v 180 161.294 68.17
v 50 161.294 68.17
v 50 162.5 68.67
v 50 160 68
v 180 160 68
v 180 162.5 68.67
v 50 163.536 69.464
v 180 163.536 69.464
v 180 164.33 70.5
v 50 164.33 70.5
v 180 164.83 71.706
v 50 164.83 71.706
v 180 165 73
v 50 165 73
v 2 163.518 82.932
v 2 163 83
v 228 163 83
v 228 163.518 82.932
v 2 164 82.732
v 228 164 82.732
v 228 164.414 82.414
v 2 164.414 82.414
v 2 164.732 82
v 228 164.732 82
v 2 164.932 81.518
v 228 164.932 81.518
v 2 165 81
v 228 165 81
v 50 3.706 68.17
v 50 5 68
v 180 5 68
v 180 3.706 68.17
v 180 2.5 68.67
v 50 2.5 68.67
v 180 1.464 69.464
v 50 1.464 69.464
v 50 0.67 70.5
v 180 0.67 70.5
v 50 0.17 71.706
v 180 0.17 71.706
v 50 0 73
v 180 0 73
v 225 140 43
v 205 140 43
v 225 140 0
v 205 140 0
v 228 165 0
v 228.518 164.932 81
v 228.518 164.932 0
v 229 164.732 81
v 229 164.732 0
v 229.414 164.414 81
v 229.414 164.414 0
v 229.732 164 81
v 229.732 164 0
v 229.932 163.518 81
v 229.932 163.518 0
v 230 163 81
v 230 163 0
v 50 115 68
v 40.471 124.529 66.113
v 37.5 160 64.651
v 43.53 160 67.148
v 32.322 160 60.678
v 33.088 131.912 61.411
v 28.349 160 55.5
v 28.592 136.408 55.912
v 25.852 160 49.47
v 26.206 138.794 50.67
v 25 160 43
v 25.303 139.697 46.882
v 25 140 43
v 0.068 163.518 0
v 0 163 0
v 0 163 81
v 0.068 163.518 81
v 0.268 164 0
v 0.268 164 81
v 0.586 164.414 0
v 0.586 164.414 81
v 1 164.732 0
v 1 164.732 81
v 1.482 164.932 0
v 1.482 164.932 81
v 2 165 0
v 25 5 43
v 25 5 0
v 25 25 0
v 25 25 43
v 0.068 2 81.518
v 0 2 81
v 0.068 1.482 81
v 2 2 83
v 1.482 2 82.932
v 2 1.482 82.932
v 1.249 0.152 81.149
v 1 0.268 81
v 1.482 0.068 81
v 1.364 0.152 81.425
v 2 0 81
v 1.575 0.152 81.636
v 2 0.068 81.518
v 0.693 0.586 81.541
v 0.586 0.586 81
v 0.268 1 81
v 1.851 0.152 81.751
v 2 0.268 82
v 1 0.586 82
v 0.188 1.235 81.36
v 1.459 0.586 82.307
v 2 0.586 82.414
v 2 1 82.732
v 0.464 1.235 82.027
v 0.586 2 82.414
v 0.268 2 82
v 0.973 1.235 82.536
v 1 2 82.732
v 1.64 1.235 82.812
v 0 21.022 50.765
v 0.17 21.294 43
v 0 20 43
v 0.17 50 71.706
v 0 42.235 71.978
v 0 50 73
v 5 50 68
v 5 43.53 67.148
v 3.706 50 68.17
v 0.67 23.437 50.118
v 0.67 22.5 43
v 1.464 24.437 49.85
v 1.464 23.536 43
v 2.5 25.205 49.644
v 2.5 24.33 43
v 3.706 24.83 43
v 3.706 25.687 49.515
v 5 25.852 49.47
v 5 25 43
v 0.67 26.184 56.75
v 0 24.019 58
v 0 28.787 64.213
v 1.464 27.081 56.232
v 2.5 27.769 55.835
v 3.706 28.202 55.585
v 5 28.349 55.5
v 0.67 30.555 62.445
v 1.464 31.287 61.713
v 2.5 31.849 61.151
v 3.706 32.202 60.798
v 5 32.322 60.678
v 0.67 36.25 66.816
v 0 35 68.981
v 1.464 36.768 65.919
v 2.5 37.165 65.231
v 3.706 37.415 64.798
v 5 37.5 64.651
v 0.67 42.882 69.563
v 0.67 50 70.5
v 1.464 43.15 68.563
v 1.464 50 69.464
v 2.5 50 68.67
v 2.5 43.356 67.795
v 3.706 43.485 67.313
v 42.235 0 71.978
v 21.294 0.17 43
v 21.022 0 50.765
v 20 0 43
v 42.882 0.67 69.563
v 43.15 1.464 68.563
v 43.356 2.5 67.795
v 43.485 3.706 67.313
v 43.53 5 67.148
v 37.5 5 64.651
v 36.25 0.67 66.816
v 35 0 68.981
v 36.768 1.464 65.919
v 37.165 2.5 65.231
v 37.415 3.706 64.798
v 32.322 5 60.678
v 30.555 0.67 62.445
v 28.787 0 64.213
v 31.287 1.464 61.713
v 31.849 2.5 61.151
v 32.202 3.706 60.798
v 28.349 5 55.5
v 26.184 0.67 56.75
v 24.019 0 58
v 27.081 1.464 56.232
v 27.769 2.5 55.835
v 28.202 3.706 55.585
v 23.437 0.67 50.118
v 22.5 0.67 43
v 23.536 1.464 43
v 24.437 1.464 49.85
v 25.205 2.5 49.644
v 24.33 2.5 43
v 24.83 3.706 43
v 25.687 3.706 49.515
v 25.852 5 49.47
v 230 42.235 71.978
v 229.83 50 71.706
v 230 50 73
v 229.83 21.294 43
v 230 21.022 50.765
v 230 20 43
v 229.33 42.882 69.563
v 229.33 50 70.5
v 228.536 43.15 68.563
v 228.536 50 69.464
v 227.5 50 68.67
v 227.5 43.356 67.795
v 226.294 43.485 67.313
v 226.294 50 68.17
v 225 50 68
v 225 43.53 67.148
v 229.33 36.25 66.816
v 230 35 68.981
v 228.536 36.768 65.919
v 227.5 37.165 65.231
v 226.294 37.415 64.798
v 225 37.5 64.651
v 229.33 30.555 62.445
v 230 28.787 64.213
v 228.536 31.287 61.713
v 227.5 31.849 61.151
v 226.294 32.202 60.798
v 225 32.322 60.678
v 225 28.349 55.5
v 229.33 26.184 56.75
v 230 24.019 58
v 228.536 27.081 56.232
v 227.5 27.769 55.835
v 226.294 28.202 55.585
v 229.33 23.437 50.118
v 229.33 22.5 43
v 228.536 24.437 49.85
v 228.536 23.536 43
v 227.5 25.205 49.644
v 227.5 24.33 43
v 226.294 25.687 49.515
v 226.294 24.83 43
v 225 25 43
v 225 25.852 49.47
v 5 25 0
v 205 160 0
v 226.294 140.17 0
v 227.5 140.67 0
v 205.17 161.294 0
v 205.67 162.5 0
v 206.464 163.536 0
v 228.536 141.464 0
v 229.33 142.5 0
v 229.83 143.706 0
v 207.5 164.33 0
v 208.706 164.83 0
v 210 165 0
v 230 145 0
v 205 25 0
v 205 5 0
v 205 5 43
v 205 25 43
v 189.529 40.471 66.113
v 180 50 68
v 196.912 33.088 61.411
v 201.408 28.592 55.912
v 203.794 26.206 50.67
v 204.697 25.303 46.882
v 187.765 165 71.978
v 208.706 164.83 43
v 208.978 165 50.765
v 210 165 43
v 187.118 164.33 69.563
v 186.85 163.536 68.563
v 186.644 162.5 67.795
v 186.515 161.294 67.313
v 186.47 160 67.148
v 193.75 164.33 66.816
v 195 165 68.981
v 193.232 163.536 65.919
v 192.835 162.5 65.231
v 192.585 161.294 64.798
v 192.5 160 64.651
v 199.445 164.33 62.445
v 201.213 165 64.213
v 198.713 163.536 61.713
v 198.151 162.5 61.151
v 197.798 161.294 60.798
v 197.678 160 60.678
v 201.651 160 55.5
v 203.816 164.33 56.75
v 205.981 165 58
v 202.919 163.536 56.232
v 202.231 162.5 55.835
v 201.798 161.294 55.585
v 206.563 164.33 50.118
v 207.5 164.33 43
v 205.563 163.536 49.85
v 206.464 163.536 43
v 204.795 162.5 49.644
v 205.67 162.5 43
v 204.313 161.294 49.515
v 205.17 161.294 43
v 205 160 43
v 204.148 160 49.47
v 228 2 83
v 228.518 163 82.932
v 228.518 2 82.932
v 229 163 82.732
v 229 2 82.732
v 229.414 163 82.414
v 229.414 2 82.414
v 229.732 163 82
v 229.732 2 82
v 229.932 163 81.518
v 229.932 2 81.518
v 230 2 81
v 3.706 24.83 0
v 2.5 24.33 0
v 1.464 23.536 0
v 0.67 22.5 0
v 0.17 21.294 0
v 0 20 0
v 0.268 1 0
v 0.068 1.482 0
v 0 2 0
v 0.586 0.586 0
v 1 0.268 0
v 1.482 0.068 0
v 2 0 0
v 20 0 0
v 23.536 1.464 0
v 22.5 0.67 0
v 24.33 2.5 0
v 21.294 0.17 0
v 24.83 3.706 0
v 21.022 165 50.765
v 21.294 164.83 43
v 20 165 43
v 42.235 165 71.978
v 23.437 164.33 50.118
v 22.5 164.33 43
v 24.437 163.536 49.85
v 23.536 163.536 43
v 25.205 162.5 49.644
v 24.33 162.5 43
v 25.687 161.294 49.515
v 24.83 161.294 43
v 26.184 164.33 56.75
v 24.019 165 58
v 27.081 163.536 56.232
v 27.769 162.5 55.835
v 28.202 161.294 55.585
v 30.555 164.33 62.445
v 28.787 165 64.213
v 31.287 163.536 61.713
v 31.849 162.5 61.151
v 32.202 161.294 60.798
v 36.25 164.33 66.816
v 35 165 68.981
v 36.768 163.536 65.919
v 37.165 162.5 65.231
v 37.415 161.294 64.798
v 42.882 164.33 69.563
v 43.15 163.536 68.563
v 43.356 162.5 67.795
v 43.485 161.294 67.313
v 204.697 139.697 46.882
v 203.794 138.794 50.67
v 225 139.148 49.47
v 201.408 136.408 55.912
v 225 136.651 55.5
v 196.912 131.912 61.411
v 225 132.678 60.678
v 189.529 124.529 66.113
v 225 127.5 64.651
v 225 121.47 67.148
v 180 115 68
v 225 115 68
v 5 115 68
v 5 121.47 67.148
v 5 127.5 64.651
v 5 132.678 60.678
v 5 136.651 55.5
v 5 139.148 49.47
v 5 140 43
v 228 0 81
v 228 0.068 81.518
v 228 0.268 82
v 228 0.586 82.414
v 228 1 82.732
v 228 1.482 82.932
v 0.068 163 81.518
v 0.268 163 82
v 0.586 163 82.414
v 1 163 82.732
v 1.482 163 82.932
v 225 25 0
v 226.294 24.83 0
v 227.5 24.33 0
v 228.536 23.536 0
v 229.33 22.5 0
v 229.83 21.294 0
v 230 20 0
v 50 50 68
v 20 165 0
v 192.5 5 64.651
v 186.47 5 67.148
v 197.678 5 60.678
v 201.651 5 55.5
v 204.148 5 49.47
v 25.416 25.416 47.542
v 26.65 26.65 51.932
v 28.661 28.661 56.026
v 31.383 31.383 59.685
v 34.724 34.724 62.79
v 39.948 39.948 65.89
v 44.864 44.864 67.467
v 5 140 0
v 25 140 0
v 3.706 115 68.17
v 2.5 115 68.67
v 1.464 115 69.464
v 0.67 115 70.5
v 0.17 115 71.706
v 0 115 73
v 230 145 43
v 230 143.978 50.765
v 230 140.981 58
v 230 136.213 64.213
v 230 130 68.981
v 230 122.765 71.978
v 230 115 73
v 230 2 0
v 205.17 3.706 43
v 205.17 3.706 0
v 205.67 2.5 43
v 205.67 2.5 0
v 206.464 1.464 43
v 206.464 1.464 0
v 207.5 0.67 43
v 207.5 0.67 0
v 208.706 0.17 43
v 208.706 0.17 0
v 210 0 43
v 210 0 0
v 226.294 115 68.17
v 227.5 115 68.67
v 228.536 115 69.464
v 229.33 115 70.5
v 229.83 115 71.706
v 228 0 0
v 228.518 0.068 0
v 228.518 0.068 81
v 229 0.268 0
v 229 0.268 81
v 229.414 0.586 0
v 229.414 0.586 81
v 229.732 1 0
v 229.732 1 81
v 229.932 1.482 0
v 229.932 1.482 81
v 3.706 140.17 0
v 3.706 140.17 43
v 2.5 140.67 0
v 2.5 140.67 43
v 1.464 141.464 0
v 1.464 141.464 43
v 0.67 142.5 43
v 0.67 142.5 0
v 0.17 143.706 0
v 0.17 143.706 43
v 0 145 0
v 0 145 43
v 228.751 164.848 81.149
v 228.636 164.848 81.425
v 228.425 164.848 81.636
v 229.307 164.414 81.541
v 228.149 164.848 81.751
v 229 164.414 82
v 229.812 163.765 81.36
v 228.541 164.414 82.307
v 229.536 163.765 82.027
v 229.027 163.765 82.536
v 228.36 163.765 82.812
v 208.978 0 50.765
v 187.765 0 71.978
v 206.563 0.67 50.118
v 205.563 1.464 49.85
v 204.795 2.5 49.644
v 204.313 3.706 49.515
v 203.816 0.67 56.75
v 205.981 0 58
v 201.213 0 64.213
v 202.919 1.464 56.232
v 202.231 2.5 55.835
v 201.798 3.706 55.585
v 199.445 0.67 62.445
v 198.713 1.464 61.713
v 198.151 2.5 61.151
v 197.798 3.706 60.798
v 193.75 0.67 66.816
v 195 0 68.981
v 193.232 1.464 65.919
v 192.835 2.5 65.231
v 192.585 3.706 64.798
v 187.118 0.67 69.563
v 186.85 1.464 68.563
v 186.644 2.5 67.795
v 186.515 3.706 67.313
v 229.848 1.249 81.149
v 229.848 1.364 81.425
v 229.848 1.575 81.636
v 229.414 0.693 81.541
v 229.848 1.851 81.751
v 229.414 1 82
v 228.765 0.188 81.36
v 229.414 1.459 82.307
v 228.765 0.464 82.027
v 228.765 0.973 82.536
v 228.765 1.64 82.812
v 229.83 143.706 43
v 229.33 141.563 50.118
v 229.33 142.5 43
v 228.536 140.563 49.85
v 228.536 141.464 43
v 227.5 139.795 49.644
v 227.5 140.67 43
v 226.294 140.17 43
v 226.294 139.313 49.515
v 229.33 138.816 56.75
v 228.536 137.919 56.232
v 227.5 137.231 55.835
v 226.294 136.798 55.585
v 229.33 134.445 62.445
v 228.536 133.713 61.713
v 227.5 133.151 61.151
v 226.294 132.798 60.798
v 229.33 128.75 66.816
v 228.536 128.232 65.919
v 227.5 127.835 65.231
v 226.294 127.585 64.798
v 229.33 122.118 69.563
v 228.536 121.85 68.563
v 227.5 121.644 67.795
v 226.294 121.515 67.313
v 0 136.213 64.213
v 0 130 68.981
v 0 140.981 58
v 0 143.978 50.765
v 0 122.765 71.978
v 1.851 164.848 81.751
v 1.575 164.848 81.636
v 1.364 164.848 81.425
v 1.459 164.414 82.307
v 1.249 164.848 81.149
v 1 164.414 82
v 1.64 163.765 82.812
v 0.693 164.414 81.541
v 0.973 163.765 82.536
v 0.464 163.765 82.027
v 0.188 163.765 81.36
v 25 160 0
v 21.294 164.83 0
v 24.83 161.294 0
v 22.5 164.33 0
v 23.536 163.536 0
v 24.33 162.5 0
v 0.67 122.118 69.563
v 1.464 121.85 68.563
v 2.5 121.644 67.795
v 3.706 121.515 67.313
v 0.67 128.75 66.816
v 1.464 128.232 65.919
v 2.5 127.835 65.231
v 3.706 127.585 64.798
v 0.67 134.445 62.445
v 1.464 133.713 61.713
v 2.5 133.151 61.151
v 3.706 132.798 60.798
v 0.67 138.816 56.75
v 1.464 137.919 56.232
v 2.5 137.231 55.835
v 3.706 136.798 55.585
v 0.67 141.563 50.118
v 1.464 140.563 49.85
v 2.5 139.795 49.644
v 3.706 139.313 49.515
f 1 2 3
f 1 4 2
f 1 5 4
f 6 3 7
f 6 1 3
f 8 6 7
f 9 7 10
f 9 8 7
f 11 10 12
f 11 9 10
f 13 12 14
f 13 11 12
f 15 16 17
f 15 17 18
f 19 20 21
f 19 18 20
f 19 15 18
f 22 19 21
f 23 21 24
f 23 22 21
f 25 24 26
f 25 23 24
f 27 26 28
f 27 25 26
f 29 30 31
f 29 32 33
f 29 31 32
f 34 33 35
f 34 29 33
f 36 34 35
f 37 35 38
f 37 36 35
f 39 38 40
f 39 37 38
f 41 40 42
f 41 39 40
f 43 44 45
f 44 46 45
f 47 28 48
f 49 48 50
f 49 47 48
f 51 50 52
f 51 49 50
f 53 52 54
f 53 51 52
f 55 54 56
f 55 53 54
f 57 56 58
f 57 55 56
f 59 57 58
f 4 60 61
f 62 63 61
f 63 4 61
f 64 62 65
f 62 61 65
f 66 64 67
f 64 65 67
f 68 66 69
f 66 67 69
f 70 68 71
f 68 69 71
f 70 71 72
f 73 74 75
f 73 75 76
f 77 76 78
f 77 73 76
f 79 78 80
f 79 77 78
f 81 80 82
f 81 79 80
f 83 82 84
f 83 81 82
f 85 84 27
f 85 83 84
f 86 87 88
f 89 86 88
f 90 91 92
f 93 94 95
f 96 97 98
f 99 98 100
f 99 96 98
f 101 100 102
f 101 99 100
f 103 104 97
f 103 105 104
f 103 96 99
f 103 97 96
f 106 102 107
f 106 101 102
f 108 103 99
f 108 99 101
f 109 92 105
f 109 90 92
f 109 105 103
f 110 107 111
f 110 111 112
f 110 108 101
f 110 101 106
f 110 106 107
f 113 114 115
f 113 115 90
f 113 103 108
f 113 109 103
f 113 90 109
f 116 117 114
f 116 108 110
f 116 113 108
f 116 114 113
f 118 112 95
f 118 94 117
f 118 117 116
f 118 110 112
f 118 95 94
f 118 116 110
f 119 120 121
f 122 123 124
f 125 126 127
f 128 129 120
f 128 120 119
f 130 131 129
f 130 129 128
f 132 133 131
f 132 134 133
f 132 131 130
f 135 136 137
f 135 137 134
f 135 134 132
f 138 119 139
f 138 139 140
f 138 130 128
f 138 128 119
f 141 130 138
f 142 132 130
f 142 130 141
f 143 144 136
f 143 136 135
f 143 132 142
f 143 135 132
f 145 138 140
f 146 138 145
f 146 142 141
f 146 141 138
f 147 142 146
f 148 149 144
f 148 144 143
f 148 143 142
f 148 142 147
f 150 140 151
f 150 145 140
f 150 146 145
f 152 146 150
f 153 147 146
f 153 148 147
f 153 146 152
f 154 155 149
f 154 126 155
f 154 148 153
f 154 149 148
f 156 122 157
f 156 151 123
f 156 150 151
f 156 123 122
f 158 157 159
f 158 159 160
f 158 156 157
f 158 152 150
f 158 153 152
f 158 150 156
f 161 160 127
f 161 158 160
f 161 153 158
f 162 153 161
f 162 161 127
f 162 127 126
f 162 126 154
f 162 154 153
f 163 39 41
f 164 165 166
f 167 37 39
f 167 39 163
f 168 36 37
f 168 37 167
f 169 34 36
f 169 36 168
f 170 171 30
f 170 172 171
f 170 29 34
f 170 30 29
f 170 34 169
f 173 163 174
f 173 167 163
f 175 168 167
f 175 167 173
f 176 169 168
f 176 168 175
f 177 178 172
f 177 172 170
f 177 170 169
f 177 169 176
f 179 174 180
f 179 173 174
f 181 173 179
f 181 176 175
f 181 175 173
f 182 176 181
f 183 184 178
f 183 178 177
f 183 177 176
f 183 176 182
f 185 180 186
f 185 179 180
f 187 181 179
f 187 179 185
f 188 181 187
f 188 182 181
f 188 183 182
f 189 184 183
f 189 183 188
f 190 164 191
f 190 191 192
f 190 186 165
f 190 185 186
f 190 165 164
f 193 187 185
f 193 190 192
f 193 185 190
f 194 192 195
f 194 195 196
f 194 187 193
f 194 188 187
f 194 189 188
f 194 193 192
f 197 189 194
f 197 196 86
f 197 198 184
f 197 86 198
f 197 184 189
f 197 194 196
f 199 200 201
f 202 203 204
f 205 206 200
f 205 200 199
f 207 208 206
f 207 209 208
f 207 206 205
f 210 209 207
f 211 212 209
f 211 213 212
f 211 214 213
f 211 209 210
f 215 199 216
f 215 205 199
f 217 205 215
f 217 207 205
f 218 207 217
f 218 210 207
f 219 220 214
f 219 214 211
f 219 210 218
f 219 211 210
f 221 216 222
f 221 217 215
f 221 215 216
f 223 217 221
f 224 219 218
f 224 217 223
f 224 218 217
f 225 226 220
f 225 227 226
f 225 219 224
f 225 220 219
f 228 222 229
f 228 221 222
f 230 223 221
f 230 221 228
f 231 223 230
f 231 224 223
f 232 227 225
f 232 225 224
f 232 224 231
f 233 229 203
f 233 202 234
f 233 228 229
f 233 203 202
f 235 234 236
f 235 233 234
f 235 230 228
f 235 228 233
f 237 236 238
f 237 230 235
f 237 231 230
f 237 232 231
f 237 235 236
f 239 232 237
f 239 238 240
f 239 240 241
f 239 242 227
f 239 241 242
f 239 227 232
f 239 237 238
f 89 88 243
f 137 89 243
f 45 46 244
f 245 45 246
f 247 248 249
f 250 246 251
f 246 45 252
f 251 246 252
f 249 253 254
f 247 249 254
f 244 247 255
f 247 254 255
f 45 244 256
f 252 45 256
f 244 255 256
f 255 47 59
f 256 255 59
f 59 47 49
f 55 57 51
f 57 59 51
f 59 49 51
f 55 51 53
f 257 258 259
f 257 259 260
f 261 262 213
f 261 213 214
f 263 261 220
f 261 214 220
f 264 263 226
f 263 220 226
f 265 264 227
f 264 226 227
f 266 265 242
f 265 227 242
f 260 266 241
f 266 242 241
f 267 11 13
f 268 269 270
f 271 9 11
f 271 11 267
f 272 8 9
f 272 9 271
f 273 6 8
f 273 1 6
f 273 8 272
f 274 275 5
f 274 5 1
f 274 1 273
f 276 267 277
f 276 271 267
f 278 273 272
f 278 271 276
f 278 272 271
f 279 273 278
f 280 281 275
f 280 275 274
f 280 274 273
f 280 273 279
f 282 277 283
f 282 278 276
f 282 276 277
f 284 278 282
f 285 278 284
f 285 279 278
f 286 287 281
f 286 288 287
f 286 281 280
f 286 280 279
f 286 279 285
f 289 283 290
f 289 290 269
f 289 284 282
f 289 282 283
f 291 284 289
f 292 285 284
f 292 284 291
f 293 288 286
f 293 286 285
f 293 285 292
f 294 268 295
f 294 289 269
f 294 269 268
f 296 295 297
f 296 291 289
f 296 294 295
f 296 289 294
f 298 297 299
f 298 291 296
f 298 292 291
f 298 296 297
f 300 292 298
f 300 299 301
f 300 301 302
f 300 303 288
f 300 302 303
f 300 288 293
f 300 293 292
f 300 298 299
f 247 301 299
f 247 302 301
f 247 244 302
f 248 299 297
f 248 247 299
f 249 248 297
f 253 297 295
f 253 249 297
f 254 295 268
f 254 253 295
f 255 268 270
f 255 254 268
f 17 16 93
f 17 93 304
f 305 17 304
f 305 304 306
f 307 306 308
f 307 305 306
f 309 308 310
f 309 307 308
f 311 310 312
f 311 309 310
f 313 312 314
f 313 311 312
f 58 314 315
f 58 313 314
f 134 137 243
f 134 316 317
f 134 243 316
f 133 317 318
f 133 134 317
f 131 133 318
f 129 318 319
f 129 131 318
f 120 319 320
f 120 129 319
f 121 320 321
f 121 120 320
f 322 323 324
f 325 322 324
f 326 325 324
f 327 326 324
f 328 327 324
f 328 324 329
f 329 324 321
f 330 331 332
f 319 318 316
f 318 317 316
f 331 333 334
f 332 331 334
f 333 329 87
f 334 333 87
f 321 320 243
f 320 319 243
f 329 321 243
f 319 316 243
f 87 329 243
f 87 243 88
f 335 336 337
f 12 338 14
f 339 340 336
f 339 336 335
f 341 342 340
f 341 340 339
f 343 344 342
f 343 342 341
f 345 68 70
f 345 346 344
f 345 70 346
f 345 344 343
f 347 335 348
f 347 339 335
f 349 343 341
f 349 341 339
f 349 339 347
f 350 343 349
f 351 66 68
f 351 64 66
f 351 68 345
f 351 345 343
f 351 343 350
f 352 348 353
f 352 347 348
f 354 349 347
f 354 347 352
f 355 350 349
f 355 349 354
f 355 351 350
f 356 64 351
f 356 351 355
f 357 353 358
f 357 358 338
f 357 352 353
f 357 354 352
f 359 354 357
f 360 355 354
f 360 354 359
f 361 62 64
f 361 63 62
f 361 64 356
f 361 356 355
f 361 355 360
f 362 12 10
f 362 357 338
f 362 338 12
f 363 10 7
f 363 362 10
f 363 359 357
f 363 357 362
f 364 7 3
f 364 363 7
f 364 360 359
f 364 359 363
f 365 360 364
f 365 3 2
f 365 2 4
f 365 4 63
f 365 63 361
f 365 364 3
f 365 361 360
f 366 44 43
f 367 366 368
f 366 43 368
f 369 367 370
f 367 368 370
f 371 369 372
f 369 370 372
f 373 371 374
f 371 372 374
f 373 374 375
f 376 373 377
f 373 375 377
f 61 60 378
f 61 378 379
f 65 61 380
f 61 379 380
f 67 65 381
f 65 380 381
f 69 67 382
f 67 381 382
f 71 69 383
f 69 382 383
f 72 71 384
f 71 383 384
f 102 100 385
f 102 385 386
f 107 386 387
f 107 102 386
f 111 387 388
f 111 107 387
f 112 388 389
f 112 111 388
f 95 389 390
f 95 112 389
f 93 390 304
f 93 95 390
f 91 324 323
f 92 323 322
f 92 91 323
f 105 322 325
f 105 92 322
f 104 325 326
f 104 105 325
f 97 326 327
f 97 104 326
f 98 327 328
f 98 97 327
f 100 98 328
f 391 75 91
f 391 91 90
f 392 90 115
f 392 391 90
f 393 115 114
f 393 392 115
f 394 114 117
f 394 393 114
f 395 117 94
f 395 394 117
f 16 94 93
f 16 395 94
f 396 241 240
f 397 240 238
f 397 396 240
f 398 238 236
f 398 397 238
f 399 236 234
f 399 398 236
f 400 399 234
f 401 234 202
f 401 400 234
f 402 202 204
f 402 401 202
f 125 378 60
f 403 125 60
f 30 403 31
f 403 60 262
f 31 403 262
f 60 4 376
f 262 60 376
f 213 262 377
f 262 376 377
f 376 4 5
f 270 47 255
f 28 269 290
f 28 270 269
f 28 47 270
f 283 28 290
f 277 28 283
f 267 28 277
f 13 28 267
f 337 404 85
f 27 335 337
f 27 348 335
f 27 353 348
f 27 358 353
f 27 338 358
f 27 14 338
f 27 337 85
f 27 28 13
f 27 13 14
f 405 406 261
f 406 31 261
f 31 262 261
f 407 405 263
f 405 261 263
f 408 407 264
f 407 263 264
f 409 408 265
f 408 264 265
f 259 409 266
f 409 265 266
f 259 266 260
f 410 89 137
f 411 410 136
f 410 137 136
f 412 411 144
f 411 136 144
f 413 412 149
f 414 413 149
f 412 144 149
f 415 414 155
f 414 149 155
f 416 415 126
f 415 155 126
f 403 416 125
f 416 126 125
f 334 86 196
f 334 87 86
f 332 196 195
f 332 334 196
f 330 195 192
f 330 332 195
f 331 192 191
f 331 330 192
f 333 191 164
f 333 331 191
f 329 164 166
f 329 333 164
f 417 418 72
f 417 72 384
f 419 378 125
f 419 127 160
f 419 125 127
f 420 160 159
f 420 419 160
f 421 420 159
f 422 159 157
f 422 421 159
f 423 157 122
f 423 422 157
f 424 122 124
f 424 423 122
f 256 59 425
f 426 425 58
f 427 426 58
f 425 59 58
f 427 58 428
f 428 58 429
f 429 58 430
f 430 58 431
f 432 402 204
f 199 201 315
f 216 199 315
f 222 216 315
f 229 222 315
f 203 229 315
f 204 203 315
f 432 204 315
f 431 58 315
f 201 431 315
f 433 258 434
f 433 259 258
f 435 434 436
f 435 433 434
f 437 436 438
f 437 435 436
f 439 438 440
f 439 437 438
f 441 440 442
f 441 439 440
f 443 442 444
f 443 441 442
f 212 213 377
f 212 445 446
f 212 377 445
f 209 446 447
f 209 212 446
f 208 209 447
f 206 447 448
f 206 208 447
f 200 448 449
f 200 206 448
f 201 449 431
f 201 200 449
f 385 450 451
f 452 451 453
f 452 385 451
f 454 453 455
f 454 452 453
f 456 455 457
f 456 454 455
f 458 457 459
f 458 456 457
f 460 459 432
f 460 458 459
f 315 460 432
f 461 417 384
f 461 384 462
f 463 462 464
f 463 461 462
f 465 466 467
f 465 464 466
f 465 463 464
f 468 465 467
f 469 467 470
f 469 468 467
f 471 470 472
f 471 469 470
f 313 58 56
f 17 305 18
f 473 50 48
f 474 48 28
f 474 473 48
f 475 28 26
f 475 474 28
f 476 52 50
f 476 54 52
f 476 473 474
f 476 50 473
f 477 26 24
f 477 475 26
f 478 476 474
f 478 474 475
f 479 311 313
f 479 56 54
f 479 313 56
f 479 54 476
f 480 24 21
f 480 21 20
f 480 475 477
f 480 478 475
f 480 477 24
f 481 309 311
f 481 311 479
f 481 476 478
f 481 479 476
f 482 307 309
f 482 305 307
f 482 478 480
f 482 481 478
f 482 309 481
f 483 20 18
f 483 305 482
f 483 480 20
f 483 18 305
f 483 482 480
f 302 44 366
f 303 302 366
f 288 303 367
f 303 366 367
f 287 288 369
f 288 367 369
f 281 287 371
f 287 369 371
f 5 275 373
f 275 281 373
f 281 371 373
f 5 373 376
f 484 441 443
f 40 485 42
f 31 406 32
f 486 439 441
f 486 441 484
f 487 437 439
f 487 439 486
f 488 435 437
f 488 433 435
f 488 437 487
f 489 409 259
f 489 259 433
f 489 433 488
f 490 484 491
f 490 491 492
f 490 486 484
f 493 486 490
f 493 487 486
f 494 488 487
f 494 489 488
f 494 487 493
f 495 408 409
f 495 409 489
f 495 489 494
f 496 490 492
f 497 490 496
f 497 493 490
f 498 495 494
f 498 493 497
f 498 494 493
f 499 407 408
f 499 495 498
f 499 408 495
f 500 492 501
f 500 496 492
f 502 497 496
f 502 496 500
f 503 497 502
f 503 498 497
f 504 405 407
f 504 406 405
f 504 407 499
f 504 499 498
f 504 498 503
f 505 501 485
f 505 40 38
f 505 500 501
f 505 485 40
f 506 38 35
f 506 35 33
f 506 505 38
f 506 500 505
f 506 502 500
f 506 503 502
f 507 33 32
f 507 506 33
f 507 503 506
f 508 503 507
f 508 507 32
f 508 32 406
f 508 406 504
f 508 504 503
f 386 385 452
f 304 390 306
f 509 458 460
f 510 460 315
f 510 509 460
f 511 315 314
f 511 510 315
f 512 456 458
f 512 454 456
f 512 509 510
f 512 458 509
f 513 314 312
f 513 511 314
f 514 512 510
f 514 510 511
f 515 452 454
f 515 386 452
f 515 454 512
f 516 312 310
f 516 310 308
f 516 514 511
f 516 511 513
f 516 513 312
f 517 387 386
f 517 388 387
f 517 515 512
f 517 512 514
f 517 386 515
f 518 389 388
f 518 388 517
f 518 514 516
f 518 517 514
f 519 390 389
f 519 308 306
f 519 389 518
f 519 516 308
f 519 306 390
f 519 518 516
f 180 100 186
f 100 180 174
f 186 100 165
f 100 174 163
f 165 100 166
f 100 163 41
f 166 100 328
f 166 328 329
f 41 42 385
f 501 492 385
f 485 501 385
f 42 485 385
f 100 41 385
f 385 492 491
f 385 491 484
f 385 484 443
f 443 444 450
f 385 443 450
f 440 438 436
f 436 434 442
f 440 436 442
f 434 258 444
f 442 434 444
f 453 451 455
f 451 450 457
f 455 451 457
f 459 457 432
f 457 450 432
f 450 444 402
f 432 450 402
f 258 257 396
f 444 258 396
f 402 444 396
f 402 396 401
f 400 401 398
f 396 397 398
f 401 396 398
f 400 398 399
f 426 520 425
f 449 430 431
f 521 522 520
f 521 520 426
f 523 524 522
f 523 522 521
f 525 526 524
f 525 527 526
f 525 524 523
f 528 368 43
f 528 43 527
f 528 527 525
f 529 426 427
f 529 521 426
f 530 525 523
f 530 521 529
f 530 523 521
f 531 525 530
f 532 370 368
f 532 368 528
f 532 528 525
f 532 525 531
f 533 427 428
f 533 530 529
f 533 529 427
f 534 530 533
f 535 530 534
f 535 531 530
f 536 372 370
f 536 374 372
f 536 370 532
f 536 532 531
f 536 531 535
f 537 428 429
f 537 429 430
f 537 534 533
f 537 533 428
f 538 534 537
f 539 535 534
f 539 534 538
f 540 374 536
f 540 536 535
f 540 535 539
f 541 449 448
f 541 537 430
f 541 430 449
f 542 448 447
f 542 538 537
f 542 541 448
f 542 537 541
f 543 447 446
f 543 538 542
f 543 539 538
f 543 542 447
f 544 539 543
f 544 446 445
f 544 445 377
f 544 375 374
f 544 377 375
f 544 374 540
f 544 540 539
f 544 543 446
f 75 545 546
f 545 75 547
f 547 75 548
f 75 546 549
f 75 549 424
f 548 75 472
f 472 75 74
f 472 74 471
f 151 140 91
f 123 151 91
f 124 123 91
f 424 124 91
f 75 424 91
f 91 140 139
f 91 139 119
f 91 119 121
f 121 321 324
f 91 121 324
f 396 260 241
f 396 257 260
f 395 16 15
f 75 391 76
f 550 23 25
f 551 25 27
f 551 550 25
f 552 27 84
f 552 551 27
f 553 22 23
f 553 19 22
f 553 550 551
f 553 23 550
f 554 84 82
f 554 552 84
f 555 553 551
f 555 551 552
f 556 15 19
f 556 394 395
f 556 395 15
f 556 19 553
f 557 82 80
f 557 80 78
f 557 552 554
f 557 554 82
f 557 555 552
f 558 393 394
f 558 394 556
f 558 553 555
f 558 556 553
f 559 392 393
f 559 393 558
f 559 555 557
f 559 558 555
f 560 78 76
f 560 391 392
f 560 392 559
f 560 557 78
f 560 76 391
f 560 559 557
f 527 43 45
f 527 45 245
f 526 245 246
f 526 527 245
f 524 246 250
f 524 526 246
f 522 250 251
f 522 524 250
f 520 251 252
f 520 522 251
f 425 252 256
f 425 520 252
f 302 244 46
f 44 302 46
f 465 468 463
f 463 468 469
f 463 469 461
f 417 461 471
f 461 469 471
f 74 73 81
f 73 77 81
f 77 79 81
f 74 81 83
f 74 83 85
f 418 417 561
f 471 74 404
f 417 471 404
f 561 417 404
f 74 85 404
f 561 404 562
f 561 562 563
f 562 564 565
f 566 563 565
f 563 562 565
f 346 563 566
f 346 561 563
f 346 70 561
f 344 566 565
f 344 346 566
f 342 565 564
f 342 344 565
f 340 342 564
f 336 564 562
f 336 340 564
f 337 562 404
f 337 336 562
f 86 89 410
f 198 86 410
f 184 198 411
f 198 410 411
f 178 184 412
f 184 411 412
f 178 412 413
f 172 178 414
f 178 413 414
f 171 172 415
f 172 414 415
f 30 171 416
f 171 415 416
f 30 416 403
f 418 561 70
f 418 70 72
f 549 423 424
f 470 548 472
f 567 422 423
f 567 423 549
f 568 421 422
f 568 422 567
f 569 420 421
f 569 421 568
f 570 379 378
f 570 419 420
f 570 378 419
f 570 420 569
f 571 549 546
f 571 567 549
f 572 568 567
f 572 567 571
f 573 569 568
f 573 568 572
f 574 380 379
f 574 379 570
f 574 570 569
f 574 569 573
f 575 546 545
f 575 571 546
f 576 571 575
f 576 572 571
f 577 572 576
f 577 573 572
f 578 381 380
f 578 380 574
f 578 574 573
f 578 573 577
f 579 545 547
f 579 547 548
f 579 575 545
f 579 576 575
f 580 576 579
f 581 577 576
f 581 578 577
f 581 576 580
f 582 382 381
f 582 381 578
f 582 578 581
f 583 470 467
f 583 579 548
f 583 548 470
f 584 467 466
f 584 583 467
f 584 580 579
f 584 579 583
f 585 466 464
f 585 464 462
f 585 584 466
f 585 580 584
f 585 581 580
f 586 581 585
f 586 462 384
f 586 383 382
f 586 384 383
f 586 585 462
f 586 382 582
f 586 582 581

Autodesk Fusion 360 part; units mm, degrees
sketch "Boceto1" plane through (0, 0, 0) normal (0, 0, 1) x (1, 0, 0)
  line L0 (0, 0) -> (230, 0)
  line L1 (230, 0) -> (230, 165)
  line L2 (230, 165) -> (0, 165)
  line L3 (0, 165) -> (0, 0)
  line L4 (0, 165) -> (25, 165)
  line L5 (25, 165) -> (25, 140)
  line L6 (25, 140) -> (0, 140)
  line L7 (0, 140) -> (0, 165)
  line L8 (230, 165) -> (205, 165)
  line L9 (205, 165) -> (205, 140)
  line L10 (205, 140) -> (230, 140)
  line L11 (230, 140) -> (230, 165)
  line L12 (230, 0) -> (205, 0)
  line L13 (205, 0) -> (205, 25)
  line L14 (205, 25) -> (230, 25)
  line L15 (230, 25) -> (230, 0)
  line L16 (0, 0) -> (25, 0)
  line L17 (25, 0) -> (25, 25)
  line L18 (25, 25) -> (0, 25)
  line L19 (0, 25) -> (0, 0)
  dimension "d1" = 230
  dimension "d2" = 165
  dimension "d12" = 25
ref_plane "WorkPlane1" through (115, 82.5, 83) normal (0, 0, 1) x (1, 0, 0)
extrude "Extrude4" add sketch "Boceto1" along normal blind 83 contours L0 L3 L16 L17 L18 L19 | L0 L1 L12 L13 L14 L15 | L2 L3 L4 L5 L6 L7 | L1 L2 L8 L9 L10 L11 makes body 1 at (0, 16.6667, 27.6667) makes body 2 at (205, 8.3333, 27.6667) makes body 3 at (0, 156.6667, 27.6667) makes body 4 at (213.3333, 140, 27.6667)
sketch "Sketch4" plane through (0, 0, 83) normal (0, 0, 1) x (1, 0, 0)
  line L0 (25, 25) -> (0, 25)
  line L1 (25, 0) -> (25, 25)
  line L2 (0, 0) -> (25, 0)
  line L3 (0, 25) -> (0, 0)
  line L4 (0, 140) -> (0, 165)
  line L5 (0, 165) -> (25, 165)
  line L6 (25, 165) -> (25, 140)
  line L7 (25, 140) -> (0, 140)
  line L8 (205, 140) -> (230, 140)
  line L9 (205, 165) -> (205, 140)
  line L10 (230, 165) -> (205, 165)
  line L11 (230, 140) -> (230, 165)
  line L12 (230, 25) -> (230, 0)
  line L13 (230, 0) -> (205, 0)
  line L14 (205, 0) -> (205, 25)
  line L15 (205, 25) -> (230, 25)
  line L16 (0, 0) -> (230, 0)
  line L17 (230, 0) -> (230, 165)
  line L18 (230, 165) -> (0, 165)
  line L19 (0, 165) -> (0, 0)
extrude "Extrude5" add sketch "Sketch4" against normal blind 15 bodies 1 2 3 4
sketch "Sketch5" plane through (0, 0, 83) normal (0, 0, 1) x (-1, 0, 0)
  line L0 (-230, -165) -> (0, -165)
  line L1 (0, -165) -> (0, 0)
  line L2 (0, 0) -> (-230, 0)
  line L3 (-230, 0) -> (-230, -165)
  line L4 (-5, -5) -> (-225, -5)
  line L5 (-225, -5) -> (-225, -160)
  line L6 (-225, -160) -> (-5, -160)
  line L7 (-5, -160) -> (-5, -5)
  dimension "d17" = -5
fillet "Fillet1" radius 25 8 edges at (12.5, 25, 68) (25, 12.5, 68) (25, 152.5, 68) (12.5, 140, 68) (217.5, 140, 68) (205, 152.5, 68) (205, 12.5, 68) (217.5, 25, 68) on bodies 1
fillet "Fillet2" radius 5 20 edges at (205, 0, 21.5) (197.6777, 0, 60.6777) (115, 0, 68) (32.3223, 0, 60.6777) (25, 0, 21.5) (230, 140, 21.5) (230, 132.6777, 60.6777) (230, 82.5, 68) (230, 32.3223, 60.6777) (230, 25, 21.5) (25, 165, 21.5) (32.3223, 165, 60.6777) (115, 165, 68) (197.6777, 165, 60.6777) (205, 165, 21.5) (0, 25, 21.5) (0, 32.3223, 60.6777) (0, 82.5, 68) (0, 132.6777, 60.6777) (0, 140, 21.5) on bodies 1
fillet "Fillet3" radius 2 8 edges at (0, 82.5, 83) (115, 0, 83) (0, 0, 41.5) (230, 0, 41.5) (230, 82.5, 83) (230, 165, 41.5) (115, 165, 83) (0, 165, 41.5) on bodies 1
